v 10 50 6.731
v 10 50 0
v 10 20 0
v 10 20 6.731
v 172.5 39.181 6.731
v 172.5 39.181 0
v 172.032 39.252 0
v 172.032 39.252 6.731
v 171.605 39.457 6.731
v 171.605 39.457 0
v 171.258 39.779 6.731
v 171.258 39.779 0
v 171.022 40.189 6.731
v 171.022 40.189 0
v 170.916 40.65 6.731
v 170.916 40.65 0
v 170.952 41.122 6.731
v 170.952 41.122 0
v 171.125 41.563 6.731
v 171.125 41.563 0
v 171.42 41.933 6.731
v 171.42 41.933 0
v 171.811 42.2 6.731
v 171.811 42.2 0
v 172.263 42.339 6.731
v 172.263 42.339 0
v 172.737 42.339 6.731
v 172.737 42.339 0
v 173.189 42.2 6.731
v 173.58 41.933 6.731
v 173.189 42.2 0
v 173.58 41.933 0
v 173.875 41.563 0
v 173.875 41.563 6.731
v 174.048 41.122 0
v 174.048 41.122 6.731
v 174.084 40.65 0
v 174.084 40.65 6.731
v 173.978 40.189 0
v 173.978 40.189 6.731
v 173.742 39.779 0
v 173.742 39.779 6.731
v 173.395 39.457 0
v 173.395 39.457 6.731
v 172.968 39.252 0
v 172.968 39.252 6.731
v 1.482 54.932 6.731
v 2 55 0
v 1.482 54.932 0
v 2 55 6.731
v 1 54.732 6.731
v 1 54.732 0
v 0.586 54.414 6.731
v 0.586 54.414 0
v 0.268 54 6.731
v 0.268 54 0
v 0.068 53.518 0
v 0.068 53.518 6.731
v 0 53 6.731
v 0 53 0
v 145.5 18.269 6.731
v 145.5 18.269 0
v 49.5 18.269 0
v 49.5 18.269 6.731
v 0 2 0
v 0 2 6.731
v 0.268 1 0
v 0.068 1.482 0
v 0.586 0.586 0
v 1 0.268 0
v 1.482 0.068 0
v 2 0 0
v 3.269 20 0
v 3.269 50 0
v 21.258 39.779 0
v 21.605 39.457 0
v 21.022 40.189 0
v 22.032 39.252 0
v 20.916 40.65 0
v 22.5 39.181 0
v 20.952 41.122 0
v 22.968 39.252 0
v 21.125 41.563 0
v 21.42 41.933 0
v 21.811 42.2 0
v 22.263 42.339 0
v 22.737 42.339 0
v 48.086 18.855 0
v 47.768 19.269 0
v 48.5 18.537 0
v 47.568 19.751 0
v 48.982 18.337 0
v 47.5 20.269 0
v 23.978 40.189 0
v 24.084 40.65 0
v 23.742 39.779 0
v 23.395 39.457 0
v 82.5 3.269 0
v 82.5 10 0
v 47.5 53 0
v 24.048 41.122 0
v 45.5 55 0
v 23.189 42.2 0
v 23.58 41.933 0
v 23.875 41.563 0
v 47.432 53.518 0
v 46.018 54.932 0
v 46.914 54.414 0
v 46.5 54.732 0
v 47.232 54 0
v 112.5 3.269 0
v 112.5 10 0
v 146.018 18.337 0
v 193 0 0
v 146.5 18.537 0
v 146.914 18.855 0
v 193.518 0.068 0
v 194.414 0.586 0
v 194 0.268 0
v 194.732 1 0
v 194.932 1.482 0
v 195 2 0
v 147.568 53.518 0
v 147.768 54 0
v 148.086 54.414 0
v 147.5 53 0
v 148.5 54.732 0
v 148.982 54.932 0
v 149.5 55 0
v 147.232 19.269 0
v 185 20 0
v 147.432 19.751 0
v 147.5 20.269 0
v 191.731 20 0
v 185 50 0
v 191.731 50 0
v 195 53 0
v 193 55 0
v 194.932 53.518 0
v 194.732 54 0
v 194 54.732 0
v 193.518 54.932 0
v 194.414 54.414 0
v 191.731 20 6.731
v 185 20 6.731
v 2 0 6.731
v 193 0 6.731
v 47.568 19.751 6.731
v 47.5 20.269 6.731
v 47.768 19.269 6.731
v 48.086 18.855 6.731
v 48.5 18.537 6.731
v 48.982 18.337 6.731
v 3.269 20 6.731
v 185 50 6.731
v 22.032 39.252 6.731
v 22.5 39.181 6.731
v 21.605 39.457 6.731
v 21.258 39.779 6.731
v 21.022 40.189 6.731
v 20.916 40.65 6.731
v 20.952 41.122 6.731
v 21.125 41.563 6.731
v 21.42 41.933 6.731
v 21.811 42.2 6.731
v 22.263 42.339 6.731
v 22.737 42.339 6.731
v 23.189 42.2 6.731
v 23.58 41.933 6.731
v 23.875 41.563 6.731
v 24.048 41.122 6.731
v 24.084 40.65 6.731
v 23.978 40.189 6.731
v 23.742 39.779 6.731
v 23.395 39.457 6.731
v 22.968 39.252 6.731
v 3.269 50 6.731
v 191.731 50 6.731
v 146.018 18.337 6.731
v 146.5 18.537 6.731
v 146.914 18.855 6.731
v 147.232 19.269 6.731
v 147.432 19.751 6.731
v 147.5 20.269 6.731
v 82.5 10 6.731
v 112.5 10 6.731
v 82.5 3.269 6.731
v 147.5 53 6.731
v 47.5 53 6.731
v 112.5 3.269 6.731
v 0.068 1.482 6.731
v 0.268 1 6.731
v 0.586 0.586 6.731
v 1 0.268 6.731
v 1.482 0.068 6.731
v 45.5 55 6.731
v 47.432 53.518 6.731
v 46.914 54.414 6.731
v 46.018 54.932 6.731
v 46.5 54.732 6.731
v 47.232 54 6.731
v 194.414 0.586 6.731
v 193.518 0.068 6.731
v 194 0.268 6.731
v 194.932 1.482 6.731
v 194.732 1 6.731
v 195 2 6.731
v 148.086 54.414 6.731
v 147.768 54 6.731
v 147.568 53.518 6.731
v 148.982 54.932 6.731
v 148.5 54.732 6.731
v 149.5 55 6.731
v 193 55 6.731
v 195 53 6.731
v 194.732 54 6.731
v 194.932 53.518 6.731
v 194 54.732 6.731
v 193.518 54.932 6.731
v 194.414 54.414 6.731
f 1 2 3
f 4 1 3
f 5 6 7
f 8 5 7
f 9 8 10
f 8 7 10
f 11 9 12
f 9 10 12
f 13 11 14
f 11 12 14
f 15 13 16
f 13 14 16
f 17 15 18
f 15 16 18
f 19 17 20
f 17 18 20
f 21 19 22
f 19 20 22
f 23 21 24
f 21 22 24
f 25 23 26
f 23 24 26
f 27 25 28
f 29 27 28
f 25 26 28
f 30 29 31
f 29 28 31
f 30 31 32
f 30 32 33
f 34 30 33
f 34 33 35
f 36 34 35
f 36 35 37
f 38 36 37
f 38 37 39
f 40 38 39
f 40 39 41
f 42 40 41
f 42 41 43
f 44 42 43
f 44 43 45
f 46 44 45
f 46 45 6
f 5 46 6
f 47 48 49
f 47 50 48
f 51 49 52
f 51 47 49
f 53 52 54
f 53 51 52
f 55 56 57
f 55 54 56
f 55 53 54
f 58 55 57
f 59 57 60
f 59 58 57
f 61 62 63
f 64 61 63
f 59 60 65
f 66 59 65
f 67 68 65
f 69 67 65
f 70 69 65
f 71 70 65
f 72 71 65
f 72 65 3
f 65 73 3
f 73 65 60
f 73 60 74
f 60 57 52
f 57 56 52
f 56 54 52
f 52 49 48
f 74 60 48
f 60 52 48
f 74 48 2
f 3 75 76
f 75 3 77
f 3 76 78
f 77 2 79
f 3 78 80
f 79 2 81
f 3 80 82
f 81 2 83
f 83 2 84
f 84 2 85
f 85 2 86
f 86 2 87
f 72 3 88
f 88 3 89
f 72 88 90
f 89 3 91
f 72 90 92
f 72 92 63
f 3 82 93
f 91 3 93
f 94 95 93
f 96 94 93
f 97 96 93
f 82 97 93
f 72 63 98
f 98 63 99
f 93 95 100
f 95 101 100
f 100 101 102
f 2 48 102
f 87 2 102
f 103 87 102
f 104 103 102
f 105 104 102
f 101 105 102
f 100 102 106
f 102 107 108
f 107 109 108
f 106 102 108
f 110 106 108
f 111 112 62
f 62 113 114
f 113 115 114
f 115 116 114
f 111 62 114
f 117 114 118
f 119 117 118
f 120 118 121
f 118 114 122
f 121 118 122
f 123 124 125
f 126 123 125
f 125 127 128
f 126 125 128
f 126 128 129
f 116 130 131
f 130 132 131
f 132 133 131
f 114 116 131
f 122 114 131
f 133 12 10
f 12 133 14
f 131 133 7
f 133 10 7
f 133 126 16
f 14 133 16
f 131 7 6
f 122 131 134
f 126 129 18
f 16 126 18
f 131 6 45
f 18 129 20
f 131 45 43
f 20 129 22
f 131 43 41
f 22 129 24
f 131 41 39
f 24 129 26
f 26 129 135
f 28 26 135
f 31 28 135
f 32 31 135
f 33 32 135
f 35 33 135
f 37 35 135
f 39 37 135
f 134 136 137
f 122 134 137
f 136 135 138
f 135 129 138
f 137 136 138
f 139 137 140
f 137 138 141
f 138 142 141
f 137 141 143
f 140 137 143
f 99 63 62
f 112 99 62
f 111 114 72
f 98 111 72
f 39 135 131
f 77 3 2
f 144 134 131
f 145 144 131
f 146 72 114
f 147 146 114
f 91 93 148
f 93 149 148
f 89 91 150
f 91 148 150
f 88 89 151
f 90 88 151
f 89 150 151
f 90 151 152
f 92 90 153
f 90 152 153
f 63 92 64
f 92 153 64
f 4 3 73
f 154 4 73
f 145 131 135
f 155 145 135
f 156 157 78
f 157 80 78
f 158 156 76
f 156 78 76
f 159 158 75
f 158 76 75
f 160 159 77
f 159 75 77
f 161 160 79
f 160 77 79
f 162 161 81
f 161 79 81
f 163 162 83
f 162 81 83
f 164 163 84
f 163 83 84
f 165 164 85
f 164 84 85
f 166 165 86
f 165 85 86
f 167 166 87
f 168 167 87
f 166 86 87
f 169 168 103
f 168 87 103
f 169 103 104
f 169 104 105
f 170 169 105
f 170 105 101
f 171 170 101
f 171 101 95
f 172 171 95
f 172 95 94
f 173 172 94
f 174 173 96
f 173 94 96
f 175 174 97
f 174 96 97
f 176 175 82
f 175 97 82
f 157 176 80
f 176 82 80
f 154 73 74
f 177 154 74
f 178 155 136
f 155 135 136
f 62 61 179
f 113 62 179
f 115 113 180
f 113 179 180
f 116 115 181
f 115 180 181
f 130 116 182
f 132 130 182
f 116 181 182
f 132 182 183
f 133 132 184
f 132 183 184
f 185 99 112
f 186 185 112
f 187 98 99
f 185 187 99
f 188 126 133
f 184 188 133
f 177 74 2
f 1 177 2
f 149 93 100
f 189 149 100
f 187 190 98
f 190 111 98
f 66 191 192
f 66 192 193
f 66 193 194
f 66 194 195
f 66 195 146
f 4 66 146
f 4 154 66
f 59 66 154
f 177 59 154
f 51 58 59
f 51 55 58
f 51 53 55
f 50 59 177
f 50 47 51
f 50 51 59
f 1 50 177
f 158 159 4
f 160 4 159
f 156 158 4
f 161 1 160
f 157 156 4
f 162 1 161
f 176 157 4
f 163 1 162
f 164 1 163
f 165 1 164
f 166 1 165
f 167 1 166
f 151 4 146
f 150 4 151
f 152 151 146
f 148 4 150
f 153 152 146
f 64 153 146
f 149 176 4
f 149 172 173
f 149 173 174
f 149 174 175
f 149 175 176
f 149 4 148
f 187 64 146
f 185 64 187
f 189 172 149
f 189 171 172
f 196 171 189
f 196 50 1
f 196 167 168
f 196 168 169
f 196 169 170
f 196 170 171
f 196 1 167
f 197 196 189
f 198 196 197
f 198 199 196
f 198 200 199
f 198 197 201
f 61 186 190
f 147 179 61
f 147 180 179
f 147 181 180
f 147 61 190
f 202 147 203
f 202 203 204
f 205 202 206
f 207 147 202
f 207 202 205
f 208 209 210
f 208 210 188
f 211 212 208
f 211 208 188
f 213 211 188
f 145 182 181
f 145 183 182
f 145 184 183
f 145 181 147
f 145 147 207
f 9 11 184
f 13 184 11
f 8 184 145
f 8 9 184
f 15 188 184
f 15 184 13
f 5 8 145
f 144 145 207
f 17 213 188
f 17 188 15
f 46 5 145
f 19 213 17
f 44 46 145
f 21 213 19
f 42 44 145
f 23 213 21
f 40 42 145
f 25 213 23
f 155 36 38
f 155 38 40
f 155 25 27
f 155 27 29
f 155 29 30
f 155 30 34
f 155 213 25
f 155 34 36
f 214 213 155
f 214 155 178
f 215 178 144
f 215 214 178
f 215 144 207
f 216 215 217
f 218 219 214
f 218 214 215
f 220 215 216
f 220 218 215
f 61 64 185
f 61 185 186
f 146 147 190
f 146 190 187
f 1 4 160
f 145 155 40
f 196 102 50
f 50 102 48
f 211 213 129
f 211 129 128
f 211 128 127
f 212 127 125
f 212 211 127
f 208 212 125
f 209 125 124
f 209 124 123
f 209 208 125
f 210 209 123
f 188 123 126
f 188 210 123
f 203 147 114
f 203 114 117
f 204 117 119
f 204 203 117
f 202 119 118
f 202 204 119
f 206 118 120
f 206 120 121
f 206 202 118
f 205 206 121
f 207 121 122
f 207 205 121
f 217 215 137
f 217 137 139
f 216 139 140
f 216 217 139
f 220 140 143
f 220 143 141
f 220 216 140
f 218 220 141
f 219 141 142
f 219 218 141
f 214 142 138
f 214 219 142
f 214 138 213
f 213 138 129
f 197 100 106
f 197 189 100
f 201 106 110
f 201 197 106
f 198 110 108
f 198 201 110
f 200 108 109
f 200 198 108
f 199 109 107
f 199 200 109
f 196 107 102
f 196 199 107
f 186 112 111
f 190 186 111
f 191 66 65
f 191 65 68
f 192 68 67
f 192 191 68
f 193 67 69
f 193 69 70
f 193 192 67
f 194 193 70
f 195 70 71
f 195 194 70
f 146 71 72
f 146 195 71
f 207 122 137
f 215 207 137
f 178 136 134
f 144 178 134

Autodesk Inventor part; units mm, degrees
ref_plane "YZ Plane" through (0, 0, 0) normal (1, 0, 0) x (0, 1, 0)
ref_plane "XZ Plane" through (0, 0, 0) normal (0, 1, 0) x (-1, 0, 0)
ref_plane "XY Plane" through (0, 0, 0) normal (0, 0, 1) x (1, 0, 0)
sketch "Sketch1" plane through (0, 0, 0) normal (0, 0, 1) x (1, 0, 0)
  line L0 (0, 0) -> (195, 0)
  line L1 (195, 0) -> (195, 55)
  line L2 (195, 55) -> (0, 55)
  line L3 (0, 55) -> (0, 0)
  line L4 (3.269, 50) -> (10, 50)
  line L5 (10, 50) -> (10, 20)
  line L6 (10, 20) -> (3.269, 20)
  line L7 (3.269, 20) -> (3.269, 50)
  line L8 (185, 50) -> (191.731, 50)
  line L9 (191.731, 50) -> (191.731, 20)
  line L10 (191.731, 20) -> (185, 20)
  line L11 (185, 20) -> (185, 50)
  line L12 (82.5, 10) -> (112.5, 10)
  line L13 (112.5, 10) -> (112.5, 3.269)
  line L14 (112.5, 3.269) -> (82.5, 3.269)
  line L15 (82.5, 3.269) -> (82.5, 10)
  line L16 (47.5, 55) -> (147.5, 55)
  line L17 (147.5, 55) -> (147.5, 18.269)
  line L18 (147.5, 18.269) -> (47.5, 18.269)
  line L19 (47.5, 18.269) -> (47.5, 55)
  point P0 (3.269, 35)
  point P1 (191.731, 35)
  point P2 (97.5, 18.269)
  point P3 (97.5, 55)
  dimension "d0" = 55
  dimension "d1" = 195
  dimension "d2" = 175
  dimension "d3" = 6.731
  dimension "d4" = 72.5
  dimension "d5" = 72.5
  dimension "d6" = 30
  dimension "d7" = 3.269
  dimension "d8" = 3.269
  dimension "d25" = 10
  dimension "d26" = 10
  dimension "d28" = 36.731
  dimension "d29" = 100
extrude "Extrusion1" add sketch "Sketch1" along normal blind 6.731 contours L3 L2 L19 L18 L17 L1 L0
sketch "Sketch2" plane through (0, 0, 6.731) normal (0, 0, 1) x (1, 0, 0)
  line L0 (10, 50) -> (10, 20) projected
  line L1 (195, 55) -> (0, 55) projected
  line L2 (185, 20) -> (185, 50) projected
  point P0 (22.5, 40.769)
  point P1 (172.5, 40.769)
  dimension "d14" = 150
  dimension "d15" = 14.231
  dimension "d16" = 12.5
  dimension "d30" = 12.5
hole "Hole1" at (22.5, 40.769, 6.731) at (172.5, 40.769, 6.731) direction (0, 0, -1) diameter 3.176 end through all
fillet "Fillet1" radius 2 8 edges at (195, 55, 3.3655) (0, 55, 3.3655) (0, 0, 3.3655) (195, 0, 3.3655) (47.5, 18.269, 3.3655) (47.5, 55, 3.3655) (147.5, 55, 3.3655) (147.5, 18.269, 3.3655)
equation "\"d3\" = THICKB"
equation "\"d4\" = d5"
equation "\"d7\" = d8"
equation "\"d12\" = THICKB"
equation "\"d16\" = d30"
equation "\"THICKA\" = 3.175"
equation "\"THICKB\" = 6.731"
equation "\"THICKC\" = 12.7"
equation "\"THICKPLY\" = 5"
equation "\"MAGDIA\" = 9.5"
equation "\"BALLDIA\" = 12"
properties part number "Mount_Mega_Back"
